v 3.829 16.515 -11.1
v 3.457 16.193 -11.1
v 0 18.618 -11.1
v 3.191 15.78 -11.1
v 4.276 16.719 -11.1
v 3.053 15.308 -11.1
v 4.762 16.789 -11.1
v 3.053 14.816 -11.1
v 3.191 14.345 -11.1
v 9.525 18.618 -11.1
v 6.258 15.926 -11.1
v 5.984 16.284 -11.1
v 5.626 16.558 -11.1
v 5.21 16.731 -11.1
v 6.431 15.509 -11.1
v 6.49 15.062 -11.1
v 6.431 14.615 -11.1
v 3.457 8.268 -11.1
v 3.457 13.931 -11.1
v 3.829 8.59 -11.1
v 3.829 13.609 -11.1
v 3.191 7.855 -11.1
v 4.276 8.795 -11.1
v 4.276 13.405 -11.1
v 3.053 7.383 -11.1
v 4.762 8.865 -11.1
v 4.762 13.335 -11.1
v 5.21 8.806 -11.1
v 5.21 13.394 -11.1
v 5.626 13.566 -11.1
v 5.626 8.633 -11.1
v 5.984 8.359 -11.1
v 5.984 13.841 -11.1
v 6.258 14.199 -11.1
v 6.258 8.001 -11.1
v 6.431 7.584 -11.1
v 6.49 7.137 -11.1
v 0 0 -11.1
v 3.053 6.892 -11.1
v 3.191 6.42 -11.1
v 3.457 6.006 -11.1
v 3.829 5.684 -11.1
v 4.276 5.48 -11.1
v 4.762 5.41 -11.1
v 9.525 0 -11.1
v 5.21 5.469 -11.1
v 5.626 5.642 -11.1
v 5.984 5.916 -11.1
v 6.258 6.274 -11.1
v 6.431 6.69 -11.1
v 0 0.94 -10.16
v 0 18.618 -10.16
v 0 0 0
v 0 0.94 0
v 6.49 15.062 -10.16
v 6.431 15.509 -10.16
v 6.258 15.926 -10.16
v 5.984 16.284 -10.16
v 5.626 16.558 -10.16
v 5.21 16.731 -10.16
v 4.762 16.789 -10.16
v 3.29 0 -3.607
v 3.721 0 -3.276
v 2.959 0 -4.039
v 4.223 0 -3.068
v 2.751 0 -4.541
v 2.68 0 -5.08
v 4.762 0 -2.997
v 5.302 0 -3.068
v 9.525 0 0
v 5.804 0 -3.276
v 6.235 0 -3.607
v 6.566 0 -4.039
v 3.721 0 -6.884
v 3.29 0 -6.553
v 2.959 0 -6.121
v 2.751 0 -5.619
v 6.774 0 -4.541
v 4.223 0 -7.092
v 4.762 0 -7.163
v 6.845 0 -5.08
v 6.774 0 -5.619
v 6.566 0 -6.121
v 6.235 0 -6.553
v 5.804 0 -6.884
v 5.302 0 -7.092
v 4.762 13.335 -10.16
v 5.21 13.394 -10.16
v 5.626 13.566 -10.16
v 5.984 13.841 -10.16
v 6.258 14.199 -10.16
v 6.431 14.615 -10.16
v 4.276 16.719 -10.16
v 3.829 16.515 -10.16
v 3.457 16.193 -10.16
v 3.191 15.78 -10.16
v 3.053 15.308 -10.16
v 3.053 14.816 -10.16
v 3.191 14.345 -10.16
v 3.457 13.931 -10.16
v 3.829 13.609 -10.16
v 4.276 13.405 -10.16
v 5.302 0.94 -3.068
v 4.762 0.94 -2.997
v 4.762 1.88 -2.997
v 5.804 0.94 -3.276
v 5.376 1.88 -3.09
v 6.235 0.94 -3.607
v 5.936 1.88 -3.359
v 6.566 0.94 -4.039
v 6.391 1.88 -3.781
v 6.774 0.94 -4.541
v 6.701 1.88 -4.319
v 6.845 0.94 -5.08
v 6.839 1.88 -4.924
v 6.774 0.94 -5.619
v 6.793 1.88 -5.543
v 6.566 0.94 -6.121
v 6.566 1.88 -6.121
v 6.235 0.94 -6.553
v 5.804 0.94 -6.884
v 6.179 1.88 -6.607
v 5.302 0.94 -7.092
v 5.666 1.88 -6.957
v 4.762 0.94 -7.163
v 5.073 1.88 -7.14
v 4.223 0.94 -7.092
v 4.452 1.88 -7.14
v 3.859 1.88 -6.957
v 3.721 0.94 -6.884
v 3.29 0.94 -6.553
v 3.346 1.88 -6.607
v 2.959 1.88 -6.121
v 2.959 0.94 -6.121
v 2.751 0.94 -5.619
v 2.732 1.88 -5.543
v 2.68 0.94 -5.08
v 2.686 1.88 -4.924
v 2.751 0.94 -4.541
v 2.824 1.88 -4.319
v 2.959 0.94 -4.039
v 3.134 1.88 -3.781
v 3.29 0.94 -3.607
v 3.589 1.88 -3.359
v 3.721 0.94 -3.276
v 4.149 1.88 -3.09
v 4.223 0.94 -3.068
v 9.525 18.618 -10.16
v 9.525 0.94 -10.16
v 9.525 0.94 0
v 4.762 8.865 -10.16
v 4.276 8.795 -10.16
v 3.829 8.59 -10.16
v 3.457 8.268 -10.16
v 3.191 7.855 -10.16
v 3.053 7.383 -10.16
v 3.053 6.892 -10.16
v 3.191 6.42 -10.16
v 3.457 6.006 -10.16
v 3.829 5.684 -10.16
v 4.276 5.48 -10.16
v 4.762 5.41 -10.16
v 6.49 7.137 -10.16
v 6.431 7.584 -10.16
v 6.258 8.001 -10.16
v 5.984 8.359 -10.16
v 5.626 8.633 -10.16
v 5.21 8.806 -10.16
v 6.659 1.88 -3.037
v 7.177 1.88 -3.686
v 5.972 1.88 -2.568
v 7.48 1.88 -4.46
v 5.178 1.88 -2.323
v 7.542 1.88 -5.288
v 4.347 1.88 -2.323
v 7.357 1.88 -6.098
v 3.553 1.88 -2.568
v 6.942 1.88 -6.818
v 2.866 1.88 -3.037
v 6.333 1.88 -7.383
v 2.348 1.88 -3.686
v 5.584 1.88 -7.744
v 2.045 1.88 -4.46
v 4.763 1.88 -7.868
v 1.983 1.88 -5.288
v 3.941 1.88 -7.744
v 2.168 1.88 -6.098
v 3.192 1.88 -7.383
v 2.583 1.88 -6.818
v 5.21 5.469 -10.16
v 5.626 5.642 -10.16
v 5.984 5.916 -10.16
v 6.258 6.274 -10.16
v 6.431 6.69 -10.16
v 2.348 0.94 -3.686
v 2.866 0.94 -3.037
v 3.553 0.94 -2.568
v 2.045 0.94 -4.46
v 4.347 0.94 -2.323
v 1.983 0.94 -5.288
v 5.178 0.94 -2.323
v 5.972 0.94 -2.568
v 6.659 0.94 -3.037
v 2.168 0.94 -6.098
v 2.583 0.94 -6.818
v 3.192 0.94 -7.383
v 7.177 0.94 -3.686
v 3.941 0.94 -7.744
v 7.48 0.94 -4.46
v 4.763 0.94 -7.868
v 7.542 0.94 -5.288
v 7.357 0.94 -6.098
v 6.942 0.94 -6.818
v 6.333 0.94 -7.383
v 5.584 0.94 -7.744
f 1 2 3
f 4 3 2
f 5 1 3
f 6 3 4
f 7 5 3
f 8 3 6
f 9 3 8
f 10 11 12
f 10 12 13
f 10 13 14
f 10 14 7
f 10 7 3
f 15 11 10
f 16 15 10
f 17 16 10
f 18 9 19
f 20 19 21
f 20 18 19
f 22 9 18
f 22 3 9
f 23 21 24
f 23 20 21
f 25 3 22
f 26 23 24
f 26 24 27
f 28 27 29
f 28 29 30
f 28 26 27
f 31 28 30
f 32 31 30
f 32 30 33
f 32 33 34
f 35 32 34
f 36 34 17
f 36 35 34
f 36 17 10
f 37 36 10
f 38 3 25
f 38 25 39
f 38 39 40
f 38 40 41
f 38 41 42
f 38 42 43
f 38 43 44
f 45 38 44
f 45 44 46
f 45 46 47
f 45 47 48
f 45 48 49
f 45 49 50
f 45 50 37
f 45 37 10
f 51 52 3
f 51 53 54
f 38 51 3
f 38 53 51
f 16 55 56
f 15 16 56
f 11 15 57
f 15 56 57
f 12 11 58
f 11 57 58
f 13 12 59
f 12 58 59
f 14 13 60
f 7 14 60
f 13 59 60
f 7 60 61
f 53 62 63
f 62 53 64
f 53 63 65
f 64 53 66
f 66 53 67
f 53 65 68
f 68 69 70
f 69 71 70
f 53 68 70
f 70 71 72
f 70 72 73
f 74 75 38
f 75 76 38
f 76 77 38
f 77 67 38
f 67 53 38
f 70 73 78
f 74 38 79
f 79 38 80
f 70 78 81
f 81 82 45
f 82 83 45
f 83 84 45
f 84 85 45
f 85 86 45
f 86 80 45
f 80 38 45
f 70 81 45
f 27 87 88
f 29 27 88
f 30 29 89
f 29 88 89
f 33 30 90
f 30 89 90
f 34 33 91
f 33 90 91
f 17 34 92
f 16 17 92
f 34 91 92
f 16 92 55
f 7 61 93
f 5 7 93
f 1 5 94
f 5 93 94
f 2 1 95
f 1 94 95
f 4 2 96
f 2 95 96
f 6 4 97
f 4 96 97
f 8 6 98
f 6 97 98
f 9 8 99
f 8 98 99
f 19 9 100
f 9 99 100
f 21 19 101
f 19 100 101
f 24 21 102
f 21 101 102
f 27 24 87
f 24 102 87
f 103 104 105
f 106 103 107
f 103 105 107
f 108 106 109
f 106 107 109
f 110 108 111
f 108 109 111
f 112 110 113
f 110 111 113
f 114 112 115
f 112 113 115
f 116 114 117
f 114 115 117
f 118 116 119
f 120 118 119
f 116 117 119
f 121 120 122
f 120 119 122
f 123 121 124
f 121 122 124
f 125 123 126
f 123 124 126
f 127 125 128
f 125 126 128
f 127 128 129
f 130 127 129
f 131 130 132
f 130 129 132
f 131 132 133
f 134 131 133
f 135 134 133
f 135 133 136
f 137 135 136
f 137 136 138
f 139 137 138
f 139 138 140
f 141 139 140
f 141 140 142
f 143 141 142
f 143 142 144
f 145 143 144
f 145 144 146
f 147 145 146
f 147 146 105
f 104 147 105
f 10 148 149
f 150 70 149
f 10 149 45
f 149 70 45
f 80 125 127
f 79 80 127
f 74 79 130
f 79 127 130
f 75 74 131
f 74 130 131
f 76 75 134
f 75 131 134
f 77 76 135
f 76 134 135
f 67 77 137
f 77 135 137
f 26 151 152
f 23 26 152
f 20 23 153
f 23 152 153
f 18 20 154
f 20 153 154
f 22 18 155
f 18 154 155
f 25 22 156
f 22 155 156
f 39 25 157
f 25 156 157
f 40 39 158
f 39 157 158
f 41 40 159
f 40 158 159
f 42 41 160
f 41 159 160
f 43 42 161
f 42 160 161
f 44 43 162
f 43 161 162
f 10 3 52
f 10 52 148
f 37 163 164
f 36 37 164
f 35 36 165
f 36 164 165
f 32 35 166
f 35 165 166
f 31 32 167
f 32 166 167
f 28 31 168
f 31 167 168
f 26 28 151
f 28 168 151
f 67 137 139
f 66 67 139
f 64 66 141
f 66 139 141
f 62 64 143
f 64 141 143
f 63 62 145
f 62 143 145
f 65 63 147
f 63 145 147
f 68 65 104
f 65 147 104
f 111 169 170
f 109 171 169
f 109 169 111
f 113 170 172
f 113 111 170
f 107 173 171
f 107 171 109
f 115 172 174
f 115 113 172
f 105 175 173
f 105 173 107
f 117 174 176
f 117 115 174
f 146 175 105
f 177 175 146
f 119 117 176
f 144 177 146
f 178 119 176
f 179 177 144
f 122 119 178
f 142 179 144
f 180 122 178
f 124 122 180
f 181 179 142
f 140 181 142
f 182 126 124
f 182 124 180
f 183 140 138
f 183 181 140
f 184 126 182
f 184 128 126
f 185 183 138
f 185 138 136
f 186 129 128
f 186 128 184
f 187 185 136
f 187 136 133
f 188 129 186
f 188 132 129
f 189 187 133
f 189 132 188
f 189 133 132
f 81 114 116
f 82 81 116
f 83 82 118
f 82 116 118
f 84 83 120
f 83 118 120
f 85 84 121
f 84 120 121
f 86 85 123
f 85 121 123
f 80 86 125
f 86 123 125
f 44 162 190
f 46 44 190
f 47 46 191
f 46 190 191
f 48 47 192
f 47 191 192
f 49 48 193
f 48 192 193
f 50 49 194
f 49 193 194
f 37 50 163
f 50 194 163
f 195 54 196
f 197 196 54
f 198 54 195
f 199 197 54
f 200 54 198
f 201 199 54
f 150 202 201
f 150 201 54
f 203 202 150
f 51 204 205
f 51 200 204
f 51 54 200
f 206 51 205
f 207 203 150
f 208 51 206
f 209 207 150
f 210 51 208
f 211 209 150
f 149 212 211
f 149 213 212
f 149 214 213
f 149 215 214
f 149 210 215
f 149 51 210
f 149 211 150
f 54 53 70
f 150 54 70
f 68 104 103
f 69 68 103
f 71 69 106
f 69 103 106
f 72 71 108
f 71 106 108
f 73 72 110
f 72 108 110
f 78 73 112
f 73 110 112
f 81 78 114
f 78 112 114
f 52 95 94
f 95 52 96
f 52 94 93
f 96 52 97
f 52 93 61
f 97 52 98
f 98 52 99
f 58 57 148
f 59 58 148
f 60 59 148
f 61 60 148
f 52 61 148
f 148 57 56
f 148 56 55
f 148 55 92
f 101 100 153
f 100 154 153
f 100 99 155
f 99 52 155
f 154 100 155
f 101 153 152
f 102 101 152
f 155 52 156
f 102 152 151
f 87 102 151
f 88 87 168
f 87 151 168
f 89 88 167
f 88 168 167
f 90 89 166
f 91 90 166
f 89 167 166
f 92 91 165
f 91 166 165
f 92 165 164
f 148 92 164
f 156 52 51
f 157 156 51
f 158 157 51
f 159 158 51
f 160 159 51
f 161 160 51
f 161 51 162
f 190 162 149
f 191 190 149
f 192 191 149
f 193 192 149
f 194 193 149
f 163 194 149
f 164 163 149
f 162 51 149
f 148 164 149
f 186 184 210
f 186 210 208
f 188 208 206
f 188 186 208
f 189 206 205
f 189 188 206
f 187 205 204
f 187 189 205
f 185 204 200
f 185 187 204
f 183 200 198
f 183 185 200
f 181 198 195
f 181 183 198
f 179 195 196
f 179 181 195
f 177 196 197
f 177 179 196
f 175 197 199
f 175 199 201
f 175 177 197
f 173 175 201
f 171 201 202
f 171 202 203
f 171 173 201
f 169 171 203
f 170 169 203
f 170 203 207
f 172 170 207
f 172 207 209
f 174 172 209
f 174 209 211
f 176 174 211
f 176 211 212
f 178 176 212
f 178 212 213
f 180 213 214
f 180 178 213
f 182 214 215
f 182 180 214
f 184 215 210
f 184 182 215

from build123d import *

# Parameters (mm, degrees)
SKETCH1_W           = 9.525
SKETCH1_H           = 11.0998
BOSS_EXTRUDE1_DEPTH = 0.9398
SKETCH2_W           = 9.525
SKETCH2_H           = 0.9398
BOSS_EXTRUDE2_DEPTH = 17.6784
CUT_EXTRUDE1_DEPTH  = 24.250561203
CUT_EXTRUDE2_DEPTH  = 23.944651046
BOSS_EXTRUDE3_START = 0.9398
SKETCH7_R           = 2.78765
SKETCH7_R_2         = 2.0828
BOSS_EXTRUDE3_DEPTH = 0.9398


with BuildPart() as part:
    # Sketch1 → Boss-Extrude1 (new body)
    with BuildSketch(Plane(origin=(0, 0, 0), x_dir=(1, 0, 0), z_dir=(0, 1, 0))):
        with Locations((4.7625, 5.5499)):
            Rectangle(SKETCH1_W, SKETCH1_H)
    extrude(amount=BOSS_EXTRUDE1_DEPTH)

    # Sketch2 → Boss-Extrude2 (add)
    with BuildSketch(Plane(origin=(0, 0.9398, 0), x_dir=(1, 0, 0), z_dir=(0, 1, 0))):
        with Locations((4.7625, 10.6299)):
            Rectangle(SKETCH2_W, SKETCH2_H)
    extrude(amount=BOSS_EXTRUDE2_DEPTH)

    # Sketch3 → Cut-Extrude1 (cut, through all)
    with BuildSketch(Plane.XY.offset(-10.16)):
        with BuildLine():
            ThreePointArc((6.4897, 15.0622), (5.983814832, 16.283514832), (4.7625, 16.7894))
            Line((4.7625, 16.7894), (4.7625, 13.335))
            ThreePointArc((4.7625, 13.335), (5.983814832, 13.840885168), (6.4897, 15.0622))
        make_face()
        with BuildLine():
            Line((4.7625, 13.335), (4.7625, 16.7894))
            ThreePointArc((4.7625, 16.7894), (3.0353, 15.0622), (4.7625, 13.335))
        make_face()
        with BuildLine():
            ThreePointArc((6.4897, 7.1374), (5.983814832, 8.358714832), (4.7625, 8.8646))
            Line((4.7625, 8.8646), (4.7625, 5.4102))
            ThreePointArc((4.7625, 5.4102), (5.983814832, 5.916085168), (6.4897, 7.1374))
        make_face()
        with BuildLine():
            Line((4.7625, 5.4102), (4.7625, 8.8646))
            ThreePointArc((4.7625, 8.8646), (3.0353, 7.1374), (4.7625, 5.4102))
        make_face()
    extrude(amount=-CUT_EXTRUDE1_DEPTH, mode=Mode.SUBTRACT)

    # Sketch4 → Cut-Extrude2 (cut, through all)
    with BuildSketch(Plane(origin=(0, 0.9398, 0), x_dir=(1, 0, 0), z_dir=(0, 1, 0))):
        with BuildLine():
            ThreePointArc((6.8453, 5.08), (6.235262004, 6.552762004), (4.7625, 7.1628))
            Line((4.7625, 7.1628), (4.7625, 5.08))
            Line((4.7625, 5.08), (6.8453, 5.08))
        make_face()
        with BuildLine():
            Line((4.7625, 5.08), (4.7625, 7.1628))
            ThreePointArc((4.7625, 7.1628), (3.289737996, 6.552762004), (2.6797, 5.08))
            Line((2.6797, 5.08), (4.7625, 5.08))
        make_face()
        with BuildLine():
            Line((6.8453, 5.08), (4.7625, 5.08))
            Line((4.7625, 5.08), (4.7625, 2.9972))
            ThreePointArc((4.7625, 2.9972), (6.235262004, 3.607237996), (6.8453, 5.08))
        make_face()
        with BuildLine():
            Line((4.7625, 2.9972), (4.7625, 5.08))
            Line((4.7625, 5.08), (2.6797, 5.08))
            ThreePointArc((2.6797, 5.08), (3.289737996, 3.607237996), (4.7625, 2.9972))
        make_face()
    extrude(amount=-CUT_EXTRUDE2_DEPTH, mode=Mode.SUBTRACT)

    # Sketch7 → Boss-Extrude3 (add)
    with BuildSketch(Plane(origin=(0, 0.9398, 0), x_dir=(1, 0, 0), z_dir=(0, 1, 0)).offset(BOSS_EXTRUDE3_START)):
        with Locations(Location((4.7625, 5.08, 0), (0, 0, 90))):
            Circle(SKETCH7_R)
        with Locations(Location((4.7625, 5.08, 0), (0, 0, 270))):
            Circle(SKETCH7_R_2, mode=Mode.SUBTRACT)
    extrude(amount=-BOSS_EXTRUDE3_DEPTH)


solid = part.part
